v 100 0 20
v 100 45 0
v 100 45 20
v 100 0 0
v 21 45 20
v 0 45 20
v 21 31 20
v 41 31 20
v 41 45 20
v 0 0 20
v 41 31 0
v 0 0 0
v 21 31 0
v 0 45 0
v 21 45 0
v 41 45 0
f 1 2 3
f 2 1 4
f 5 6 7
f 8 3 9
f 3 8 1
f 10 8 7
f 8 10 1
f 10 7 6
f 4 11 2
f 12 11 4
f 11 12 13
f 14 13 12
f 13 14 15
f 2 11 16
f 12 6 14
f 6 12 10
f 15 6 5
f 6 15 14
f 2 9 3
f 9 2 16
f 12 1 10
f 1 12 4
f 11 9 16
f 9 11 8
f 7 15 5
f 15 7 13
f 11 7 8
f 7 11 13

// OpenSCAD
difference()
{
	cube([100,45,20]);
	translate([21,31,-1]) cube([20,20,25]);
}
